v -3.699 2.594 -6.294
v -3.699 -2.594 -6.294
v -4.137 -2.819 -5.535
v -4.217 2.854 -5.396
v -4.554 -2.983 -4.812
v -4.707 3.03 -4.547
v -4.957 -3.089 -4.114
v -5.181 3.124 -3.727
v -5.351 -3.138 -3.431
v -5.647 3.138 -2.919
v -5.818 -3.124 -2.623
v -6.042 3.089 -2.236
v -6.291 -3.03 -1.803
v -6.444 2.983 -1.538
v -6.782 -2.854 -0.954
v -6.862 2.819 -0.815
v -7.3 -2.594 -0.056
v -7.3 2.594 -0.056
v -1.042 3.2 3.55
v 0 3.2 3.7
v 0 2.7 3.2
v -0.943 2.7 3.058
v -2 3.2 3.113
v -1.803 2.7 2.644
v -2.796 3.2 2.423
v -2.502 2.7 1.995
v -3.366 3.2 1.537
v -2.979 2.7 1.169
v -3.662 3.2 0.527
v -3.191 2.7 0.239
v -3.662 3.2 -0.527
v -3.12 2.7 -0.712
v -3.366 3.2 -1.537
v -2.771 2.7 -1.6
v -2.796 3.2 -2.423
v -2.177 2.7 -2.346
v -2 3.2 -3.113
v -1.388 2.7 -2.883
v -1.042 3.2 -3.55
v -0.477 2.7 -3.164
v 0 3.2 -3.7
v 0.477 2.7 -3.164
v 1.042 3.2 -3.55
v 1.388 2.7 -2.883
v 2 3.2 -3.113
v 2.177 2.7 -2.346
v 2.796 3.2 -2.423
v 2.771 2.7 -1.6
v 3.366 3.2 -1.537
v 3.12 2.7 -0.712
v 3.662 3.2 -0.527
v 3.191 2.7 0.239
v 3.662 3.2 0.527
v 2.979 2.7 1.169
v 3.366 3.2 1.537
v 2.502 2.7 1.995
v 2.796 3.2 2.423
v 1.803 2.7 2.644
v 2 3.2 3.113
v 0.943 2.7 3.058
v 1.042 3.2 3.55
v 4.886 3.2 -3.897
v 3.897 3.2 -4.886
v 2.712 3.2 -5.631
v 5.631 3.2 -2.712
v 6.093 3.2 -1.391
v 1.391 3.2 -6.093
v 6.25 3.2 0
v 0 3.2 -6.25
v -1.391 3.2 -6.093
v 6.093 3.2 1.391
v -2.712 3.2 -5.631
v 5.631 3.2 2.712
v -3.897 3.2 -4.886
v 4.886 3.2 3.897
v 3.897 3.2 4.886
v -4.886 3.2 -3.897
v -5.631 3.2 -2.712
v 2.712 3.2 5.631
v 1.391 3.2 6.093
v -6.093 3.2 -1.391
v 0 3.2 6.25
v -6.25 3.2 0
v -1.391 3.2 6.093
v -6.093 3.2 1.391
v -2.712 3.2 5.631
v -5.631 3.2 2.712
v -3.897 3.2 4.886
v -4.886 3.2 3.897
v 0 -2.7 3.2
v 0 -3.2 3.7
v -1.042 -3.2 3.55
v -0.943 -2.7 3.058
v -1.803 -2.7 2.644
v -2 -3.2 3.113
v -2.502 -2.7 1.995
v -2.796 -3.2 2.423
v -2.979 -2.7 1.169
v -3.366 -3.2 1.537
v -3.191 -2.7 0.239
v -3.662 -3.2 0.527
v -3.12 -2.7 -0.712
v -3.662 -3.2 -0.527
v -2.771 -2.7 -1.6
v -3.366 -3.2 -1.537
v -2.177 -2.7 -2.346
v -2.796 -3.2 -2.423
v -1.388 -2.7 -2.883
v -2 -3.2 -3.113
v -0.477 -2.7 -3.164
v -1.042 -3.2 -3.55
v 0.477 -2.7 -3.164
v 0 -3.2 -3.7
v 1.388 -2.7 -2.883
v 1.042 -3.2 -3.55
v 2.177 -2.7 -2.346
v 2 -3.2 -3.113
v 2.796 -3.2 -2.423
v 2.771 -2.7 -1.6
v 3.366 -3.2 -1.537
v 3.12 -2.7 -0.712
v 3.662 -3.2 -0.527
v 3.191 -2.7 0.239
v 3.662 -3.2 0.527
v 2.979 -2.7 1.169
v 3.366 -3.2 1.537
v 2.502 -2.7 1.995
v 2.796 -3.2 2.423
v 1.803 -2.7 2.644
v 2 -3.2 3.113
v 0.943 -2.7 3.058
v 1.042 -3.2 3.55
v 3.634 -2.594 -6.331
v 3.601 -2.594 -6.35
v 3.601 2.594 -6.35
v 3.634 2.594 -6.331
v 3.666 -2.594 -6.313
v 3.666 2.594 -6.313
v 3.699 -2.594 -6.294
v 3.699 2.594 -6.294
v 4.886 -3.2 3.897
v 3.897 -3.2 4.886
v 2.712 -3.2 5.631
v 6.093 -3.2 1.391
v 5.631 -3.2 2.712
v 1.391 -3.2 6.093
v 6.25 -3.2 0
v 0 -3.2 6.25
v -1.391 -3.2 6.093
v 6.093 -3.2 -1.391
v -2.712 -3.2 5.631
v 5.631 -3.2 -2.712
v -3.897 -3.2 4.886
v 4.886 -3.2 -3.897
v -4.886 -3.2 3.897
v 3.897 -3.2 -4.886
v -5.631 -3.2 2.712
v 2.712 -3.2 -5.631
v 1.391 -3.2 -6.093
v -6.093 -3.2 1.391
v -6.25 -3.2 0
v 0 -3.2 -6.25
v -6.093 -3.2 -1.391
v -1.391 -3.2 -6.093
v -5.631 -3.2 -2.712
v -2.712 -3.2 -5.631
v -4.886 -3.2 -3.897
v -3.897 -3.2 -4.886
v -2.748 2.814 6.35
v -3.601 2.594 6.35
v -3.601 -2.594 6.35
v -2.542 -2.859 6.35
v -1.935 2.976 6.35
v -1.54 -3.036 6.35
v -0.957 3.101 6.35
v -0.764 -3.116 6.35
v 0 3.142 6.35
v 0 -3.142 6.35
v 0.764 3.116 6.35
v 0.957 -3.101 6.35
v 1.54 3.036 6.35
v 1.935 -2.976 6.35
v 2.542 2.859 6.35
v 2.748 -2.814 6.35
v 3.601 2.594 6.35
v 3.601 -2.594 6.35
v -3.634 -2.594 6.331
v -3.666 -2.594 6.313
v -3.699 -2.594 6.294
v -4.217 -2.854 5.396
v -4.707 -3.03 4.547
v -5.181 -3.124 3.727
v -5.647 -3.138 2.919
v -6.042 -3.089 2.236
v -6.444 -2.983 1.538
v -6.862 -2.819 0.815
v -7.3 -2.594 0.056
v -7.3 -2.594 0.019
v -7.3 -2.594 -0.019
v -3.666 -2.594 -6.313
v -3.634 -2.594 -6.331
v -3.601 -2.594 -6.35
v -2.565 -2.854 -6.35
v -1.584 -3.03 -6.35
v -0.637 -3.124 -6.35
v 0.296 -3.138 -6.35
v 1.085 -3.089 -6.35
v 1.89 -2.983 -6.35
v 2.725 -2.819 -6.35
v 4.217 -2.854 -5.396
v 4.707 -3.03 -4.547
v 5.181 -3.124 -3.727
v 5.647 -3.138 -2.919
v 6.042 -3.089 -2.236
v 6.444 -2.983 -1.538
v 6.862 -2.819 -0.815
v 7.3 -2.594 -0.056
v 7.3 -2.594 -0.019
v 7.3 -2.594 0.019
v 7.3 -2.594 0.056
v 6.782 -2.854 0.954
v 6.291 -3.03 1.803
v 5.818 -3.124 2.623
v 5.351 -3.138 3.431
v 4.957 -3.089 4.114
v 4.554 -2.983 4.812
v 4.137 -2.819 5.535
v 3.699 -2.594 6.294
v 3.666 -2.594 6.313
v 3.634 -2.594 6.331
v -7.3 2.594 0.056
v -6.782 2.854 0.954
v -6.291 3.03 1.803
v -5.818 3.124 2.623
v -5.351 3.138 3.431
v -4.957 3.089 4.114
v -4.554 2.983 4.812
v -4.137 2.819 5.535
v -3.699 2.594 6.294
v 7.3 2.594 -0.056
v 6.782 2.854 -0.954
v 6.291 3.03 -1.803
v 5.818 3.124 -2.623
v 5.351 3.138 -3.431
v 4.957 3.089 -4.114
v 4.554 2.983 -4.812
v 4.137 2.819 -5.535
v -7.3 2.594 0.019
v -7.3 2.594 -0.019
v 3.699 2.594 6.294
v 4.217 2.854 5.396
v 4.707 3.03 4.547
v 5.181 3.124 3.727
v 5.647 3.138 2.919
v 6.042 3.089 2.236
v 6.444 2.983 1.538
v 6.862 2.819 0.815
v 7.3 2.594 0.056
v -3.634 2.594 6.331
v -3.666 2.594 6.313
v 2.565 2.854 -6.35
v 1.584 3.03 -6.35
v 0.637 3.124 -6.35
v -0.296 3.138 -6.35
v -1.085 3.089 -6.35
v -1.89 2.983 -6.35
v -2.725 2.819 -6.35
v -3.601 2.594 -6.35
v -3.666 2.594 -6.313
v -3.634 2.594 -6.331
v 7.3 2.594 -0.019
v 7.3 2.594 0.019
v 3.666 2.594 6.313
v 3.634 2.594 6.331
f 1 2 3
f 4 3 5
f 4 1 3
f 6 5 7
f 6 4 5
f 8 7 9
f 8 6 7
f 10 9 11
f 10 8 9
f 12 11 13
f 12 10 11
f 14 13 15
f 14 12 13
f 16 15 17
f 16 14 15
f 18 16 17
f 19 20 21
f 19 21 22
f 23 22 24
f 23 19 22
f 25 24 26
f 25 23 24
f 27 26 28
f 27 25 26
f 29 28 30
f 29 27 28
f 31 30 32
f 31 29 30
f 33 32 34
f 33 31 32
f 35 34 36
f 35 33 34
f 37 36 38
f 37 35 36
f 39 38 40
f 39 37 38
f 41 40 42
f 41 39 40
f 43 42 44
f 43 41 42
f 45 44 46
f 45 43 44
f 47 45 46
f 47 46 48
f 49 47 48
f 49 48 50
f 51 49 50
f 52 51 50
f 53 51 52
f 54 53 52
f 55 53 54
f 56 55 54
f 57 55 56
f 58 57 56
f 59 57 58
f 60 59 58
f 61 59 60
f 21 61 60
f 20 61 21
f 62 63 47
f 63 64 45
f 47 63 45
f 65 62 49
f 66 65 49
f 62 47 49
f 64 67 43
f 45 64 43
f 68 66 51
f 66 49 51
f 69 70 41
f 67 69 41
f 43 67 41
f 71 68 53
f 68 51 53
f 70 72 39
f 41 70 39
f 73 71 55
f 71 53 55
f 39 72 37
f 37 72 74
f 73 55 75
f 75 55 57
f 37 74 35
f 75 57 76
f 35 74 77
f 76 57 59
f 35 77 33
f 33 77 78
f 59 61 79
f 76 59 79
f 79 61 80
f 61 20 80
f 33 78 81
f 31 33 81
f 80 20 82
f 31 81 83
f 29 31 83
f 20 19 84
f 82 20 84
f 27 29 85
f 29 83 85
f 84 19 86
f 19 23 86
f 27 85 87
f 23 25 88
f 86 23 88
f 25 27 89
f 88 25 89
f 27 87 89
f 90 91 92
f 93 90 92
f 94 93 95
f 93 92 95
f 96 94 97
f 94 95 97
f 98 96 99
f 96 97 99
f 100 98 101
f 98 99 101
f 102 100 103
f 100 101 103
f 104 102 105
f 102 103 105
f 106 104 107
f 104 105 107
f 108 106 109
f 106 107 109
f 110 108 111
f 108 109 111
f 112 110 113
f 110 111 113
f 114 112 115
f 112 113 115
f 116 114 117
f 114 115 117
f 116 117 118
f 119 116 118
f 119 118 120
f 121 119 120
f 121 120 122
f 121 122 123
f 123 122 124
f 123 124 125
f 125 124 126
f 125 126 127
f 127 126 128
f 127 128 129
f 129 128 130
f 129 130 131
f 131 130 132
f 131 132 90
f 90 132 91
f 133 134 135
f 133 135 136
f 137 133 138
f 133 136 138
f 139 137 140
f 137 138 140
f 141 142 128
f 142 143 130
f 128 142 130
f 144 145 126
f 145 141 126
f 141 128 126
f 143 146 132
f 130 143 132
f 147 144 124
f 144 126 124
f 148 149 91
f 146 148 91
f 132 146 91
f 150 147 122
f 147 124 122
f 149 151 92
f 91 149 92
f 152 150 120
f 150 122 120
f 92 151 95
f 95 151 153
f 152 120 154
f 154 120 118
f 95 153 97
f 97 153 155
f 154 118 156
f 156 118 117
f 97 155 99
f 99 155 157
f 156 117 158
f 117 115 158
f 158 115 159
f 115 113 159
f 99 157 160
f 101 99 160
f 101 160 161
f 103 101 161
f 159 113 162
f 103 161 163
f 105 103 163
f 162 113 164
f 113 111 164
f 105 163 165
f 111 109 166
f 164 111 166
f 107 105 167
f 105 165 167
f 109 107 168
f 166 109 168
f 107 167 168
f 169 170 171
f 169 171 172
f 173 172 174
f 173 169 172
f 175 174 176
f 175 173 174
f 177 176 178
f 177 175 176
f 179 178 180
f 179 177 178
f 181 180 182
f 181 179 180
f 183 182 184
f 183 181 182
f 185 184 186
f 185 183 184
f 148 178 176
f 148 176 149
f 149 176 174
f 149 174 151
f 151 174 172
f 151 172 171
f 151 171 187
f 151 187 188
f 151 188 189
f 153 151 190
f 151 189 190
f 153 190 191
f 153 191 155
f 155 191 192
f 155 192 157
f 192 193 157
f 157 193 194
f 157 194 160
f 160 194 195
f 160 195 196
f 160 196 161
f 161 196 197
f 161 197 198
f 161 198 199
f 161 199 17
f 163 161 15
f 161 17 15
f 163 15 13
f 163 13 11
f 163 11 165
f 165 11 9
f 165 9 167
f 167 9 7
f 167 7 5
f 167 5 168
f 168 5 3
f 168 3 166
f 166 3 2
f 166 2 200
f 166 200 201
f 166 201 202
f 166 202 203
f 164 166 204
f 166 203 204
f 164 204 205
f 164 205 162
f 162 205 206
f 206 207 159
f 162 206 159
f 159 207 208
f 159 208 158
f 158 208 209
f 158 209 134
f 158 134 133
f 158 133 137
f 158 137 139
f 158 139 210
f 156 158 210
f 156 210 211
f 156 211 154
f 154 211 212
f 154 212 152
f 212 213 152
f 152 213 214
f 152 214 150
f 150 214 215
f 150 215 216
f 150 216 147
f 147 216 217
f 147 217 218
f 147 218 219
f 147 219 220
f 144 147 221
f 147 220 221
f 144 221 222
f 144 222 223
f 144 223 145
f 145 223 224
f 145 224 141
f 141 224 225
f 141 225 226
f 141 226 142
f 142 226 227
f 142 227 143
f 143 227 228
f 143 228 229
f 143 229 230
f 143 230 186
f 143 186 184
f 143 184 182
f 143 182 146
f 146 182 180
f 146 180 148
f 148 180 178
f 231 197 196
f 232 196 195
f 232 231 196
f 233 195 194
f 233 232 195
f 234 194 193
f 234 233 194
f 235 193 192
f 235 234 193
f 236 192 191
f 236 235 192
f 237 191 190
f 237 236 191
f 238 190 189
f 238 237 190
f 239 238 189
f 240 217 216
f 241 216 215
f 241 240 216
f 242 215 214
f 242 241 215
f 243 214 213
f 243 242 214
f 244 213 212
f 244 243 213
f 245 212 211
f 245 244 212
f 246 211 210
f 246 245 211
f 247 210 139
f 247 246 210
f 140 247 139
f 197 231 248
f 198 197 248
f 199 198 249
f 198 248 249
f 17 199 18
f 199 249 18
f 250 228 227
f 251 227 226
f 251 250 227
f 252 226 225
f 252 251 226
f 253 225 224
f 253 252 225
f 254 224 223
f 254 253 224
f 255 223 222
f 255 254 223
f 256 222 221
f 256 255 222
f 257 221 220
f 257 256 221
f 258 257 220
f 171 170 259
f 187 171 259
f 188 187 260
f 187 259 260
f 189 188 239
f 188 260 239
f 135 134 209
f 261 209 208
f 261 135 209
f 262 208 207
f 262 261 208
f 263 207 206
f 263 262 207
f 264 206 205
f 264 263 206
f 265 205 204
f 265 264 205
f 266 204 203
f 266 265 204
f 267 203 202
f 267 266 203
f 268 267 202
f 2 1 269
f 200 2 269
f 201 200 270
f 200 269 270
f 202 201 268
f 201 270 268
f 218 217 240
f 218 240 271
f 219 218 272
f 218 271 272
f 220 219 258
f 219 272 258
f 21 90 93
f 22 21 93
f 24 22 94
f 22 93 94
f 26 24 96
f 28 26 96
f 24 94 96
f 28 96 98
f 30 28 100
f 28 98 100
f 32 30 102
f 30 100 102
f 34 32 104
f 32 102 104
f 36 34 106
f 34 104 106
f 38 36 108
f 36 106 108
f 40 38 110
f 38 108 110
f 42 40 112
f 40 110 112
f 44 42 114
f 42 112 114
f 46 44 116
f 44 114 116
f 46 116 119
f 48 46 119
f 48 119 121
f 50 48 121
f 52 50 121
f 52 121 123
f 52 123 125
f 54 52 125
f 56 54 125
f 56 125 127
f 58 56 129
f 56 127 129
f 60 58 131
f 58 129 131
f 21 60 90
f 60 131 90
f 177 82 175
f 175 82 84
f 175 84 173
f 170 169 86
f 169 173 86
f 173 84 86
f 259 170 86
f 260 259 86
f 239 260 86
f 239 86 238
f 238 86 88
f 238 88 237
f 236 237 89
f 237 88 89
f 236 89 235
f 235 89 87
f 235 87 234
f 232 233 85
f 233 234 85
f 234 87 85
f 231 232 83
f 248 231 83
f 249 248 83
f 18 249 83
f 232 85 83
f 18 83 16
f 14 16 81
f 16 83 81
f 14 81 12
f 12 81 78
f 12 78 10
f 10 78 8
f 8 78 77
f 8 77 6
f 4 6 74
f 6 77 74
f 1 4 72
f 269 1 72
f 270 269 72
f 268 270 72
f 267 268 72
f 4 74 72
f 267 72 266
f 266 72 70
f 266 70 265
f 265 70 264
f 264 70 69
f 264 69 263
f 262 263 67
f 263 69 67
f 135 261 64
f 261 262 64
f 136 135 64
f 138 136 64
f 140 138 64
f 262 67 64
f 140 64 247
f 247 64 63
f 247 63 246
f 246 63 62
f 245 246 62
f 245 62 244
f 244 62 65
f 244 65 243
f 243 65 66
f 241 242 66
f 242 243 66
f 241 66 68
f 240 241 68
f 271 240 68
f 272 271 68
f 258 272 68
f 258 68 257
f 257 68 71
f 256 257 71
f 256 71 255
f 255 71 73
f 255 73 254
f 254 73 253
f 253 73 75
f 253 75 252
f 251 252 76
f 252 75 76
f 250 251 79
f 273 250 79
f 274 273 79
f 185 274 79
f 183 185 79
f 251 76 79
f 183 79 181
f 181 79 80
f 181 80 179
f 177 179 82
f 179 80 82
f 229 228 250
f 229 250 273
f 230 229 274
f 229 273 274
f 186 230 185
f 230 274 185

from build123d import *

# Parameters (mm, degrees)
SKETCH2_OUTSIDE_W  = 20.924
SKETCH2_OUTSIDE_H  = 20.924
CUT_EXTRUDE1_DEPTH = 6.4
CHAMFER1_SIZE      = 0.5


with BuildPart() as part:
    # Sketch1 → Revolve1 (revolve)
    with BuildSketch(Plane(origin=(0, 0, 0), x_dir=(0, 0, -1), z_dir=(1, 0, 0)), mode=Mode.PRIVATE) as revolve1_sk:
        Polygon((3.2, 3.2), (3.2, -3.2), (6.25, -3.2), (7.3, -2.593782217), (7.3, 2.593782217), (6.25, 3.2), align=None)
    revolve(revolve1_sk.sketch.rotate(Axis((0, 12.02962963, 0), (0, -1, 0)), 180), axis=Axis((0, 12.02962963, 0), (0, -1, 0)))

    # Sketch2 outside → Cut-Extrude1 (cut)
    with BuildSketch(Plane(origin=(0, 3.2, 0), x_dir=(1, 0, 0), z_dir=(0, 1, 0))):
        Rectangle(SKETCH2_OUTSIDE_W, SKETCH2_OUTSIDE_H)
        Polygon((7.332348419, 0), (3.666174209, 6.35), (-3.666174209, 6.35), (-7.332348419, 0), (-3.666174209, -6.35), (3.666174209, -6.35), align=None, mode=Mode.SUBTRACT)
    extrude(amount=-CUT_EXTRUDE1_DEPTH, mode=Mode.SUBTRACT)

    # Chamfer1
    chamfer1_edges = [part.edges().sort_by_distance(p)[0] for p in [
        (0, -3.2, -3.2),
        (0, 3.2, -3.2),
    ]]
    chamfer(chamfer1_edges, length=CHAMFER1_SIZE)


solid = part.part
